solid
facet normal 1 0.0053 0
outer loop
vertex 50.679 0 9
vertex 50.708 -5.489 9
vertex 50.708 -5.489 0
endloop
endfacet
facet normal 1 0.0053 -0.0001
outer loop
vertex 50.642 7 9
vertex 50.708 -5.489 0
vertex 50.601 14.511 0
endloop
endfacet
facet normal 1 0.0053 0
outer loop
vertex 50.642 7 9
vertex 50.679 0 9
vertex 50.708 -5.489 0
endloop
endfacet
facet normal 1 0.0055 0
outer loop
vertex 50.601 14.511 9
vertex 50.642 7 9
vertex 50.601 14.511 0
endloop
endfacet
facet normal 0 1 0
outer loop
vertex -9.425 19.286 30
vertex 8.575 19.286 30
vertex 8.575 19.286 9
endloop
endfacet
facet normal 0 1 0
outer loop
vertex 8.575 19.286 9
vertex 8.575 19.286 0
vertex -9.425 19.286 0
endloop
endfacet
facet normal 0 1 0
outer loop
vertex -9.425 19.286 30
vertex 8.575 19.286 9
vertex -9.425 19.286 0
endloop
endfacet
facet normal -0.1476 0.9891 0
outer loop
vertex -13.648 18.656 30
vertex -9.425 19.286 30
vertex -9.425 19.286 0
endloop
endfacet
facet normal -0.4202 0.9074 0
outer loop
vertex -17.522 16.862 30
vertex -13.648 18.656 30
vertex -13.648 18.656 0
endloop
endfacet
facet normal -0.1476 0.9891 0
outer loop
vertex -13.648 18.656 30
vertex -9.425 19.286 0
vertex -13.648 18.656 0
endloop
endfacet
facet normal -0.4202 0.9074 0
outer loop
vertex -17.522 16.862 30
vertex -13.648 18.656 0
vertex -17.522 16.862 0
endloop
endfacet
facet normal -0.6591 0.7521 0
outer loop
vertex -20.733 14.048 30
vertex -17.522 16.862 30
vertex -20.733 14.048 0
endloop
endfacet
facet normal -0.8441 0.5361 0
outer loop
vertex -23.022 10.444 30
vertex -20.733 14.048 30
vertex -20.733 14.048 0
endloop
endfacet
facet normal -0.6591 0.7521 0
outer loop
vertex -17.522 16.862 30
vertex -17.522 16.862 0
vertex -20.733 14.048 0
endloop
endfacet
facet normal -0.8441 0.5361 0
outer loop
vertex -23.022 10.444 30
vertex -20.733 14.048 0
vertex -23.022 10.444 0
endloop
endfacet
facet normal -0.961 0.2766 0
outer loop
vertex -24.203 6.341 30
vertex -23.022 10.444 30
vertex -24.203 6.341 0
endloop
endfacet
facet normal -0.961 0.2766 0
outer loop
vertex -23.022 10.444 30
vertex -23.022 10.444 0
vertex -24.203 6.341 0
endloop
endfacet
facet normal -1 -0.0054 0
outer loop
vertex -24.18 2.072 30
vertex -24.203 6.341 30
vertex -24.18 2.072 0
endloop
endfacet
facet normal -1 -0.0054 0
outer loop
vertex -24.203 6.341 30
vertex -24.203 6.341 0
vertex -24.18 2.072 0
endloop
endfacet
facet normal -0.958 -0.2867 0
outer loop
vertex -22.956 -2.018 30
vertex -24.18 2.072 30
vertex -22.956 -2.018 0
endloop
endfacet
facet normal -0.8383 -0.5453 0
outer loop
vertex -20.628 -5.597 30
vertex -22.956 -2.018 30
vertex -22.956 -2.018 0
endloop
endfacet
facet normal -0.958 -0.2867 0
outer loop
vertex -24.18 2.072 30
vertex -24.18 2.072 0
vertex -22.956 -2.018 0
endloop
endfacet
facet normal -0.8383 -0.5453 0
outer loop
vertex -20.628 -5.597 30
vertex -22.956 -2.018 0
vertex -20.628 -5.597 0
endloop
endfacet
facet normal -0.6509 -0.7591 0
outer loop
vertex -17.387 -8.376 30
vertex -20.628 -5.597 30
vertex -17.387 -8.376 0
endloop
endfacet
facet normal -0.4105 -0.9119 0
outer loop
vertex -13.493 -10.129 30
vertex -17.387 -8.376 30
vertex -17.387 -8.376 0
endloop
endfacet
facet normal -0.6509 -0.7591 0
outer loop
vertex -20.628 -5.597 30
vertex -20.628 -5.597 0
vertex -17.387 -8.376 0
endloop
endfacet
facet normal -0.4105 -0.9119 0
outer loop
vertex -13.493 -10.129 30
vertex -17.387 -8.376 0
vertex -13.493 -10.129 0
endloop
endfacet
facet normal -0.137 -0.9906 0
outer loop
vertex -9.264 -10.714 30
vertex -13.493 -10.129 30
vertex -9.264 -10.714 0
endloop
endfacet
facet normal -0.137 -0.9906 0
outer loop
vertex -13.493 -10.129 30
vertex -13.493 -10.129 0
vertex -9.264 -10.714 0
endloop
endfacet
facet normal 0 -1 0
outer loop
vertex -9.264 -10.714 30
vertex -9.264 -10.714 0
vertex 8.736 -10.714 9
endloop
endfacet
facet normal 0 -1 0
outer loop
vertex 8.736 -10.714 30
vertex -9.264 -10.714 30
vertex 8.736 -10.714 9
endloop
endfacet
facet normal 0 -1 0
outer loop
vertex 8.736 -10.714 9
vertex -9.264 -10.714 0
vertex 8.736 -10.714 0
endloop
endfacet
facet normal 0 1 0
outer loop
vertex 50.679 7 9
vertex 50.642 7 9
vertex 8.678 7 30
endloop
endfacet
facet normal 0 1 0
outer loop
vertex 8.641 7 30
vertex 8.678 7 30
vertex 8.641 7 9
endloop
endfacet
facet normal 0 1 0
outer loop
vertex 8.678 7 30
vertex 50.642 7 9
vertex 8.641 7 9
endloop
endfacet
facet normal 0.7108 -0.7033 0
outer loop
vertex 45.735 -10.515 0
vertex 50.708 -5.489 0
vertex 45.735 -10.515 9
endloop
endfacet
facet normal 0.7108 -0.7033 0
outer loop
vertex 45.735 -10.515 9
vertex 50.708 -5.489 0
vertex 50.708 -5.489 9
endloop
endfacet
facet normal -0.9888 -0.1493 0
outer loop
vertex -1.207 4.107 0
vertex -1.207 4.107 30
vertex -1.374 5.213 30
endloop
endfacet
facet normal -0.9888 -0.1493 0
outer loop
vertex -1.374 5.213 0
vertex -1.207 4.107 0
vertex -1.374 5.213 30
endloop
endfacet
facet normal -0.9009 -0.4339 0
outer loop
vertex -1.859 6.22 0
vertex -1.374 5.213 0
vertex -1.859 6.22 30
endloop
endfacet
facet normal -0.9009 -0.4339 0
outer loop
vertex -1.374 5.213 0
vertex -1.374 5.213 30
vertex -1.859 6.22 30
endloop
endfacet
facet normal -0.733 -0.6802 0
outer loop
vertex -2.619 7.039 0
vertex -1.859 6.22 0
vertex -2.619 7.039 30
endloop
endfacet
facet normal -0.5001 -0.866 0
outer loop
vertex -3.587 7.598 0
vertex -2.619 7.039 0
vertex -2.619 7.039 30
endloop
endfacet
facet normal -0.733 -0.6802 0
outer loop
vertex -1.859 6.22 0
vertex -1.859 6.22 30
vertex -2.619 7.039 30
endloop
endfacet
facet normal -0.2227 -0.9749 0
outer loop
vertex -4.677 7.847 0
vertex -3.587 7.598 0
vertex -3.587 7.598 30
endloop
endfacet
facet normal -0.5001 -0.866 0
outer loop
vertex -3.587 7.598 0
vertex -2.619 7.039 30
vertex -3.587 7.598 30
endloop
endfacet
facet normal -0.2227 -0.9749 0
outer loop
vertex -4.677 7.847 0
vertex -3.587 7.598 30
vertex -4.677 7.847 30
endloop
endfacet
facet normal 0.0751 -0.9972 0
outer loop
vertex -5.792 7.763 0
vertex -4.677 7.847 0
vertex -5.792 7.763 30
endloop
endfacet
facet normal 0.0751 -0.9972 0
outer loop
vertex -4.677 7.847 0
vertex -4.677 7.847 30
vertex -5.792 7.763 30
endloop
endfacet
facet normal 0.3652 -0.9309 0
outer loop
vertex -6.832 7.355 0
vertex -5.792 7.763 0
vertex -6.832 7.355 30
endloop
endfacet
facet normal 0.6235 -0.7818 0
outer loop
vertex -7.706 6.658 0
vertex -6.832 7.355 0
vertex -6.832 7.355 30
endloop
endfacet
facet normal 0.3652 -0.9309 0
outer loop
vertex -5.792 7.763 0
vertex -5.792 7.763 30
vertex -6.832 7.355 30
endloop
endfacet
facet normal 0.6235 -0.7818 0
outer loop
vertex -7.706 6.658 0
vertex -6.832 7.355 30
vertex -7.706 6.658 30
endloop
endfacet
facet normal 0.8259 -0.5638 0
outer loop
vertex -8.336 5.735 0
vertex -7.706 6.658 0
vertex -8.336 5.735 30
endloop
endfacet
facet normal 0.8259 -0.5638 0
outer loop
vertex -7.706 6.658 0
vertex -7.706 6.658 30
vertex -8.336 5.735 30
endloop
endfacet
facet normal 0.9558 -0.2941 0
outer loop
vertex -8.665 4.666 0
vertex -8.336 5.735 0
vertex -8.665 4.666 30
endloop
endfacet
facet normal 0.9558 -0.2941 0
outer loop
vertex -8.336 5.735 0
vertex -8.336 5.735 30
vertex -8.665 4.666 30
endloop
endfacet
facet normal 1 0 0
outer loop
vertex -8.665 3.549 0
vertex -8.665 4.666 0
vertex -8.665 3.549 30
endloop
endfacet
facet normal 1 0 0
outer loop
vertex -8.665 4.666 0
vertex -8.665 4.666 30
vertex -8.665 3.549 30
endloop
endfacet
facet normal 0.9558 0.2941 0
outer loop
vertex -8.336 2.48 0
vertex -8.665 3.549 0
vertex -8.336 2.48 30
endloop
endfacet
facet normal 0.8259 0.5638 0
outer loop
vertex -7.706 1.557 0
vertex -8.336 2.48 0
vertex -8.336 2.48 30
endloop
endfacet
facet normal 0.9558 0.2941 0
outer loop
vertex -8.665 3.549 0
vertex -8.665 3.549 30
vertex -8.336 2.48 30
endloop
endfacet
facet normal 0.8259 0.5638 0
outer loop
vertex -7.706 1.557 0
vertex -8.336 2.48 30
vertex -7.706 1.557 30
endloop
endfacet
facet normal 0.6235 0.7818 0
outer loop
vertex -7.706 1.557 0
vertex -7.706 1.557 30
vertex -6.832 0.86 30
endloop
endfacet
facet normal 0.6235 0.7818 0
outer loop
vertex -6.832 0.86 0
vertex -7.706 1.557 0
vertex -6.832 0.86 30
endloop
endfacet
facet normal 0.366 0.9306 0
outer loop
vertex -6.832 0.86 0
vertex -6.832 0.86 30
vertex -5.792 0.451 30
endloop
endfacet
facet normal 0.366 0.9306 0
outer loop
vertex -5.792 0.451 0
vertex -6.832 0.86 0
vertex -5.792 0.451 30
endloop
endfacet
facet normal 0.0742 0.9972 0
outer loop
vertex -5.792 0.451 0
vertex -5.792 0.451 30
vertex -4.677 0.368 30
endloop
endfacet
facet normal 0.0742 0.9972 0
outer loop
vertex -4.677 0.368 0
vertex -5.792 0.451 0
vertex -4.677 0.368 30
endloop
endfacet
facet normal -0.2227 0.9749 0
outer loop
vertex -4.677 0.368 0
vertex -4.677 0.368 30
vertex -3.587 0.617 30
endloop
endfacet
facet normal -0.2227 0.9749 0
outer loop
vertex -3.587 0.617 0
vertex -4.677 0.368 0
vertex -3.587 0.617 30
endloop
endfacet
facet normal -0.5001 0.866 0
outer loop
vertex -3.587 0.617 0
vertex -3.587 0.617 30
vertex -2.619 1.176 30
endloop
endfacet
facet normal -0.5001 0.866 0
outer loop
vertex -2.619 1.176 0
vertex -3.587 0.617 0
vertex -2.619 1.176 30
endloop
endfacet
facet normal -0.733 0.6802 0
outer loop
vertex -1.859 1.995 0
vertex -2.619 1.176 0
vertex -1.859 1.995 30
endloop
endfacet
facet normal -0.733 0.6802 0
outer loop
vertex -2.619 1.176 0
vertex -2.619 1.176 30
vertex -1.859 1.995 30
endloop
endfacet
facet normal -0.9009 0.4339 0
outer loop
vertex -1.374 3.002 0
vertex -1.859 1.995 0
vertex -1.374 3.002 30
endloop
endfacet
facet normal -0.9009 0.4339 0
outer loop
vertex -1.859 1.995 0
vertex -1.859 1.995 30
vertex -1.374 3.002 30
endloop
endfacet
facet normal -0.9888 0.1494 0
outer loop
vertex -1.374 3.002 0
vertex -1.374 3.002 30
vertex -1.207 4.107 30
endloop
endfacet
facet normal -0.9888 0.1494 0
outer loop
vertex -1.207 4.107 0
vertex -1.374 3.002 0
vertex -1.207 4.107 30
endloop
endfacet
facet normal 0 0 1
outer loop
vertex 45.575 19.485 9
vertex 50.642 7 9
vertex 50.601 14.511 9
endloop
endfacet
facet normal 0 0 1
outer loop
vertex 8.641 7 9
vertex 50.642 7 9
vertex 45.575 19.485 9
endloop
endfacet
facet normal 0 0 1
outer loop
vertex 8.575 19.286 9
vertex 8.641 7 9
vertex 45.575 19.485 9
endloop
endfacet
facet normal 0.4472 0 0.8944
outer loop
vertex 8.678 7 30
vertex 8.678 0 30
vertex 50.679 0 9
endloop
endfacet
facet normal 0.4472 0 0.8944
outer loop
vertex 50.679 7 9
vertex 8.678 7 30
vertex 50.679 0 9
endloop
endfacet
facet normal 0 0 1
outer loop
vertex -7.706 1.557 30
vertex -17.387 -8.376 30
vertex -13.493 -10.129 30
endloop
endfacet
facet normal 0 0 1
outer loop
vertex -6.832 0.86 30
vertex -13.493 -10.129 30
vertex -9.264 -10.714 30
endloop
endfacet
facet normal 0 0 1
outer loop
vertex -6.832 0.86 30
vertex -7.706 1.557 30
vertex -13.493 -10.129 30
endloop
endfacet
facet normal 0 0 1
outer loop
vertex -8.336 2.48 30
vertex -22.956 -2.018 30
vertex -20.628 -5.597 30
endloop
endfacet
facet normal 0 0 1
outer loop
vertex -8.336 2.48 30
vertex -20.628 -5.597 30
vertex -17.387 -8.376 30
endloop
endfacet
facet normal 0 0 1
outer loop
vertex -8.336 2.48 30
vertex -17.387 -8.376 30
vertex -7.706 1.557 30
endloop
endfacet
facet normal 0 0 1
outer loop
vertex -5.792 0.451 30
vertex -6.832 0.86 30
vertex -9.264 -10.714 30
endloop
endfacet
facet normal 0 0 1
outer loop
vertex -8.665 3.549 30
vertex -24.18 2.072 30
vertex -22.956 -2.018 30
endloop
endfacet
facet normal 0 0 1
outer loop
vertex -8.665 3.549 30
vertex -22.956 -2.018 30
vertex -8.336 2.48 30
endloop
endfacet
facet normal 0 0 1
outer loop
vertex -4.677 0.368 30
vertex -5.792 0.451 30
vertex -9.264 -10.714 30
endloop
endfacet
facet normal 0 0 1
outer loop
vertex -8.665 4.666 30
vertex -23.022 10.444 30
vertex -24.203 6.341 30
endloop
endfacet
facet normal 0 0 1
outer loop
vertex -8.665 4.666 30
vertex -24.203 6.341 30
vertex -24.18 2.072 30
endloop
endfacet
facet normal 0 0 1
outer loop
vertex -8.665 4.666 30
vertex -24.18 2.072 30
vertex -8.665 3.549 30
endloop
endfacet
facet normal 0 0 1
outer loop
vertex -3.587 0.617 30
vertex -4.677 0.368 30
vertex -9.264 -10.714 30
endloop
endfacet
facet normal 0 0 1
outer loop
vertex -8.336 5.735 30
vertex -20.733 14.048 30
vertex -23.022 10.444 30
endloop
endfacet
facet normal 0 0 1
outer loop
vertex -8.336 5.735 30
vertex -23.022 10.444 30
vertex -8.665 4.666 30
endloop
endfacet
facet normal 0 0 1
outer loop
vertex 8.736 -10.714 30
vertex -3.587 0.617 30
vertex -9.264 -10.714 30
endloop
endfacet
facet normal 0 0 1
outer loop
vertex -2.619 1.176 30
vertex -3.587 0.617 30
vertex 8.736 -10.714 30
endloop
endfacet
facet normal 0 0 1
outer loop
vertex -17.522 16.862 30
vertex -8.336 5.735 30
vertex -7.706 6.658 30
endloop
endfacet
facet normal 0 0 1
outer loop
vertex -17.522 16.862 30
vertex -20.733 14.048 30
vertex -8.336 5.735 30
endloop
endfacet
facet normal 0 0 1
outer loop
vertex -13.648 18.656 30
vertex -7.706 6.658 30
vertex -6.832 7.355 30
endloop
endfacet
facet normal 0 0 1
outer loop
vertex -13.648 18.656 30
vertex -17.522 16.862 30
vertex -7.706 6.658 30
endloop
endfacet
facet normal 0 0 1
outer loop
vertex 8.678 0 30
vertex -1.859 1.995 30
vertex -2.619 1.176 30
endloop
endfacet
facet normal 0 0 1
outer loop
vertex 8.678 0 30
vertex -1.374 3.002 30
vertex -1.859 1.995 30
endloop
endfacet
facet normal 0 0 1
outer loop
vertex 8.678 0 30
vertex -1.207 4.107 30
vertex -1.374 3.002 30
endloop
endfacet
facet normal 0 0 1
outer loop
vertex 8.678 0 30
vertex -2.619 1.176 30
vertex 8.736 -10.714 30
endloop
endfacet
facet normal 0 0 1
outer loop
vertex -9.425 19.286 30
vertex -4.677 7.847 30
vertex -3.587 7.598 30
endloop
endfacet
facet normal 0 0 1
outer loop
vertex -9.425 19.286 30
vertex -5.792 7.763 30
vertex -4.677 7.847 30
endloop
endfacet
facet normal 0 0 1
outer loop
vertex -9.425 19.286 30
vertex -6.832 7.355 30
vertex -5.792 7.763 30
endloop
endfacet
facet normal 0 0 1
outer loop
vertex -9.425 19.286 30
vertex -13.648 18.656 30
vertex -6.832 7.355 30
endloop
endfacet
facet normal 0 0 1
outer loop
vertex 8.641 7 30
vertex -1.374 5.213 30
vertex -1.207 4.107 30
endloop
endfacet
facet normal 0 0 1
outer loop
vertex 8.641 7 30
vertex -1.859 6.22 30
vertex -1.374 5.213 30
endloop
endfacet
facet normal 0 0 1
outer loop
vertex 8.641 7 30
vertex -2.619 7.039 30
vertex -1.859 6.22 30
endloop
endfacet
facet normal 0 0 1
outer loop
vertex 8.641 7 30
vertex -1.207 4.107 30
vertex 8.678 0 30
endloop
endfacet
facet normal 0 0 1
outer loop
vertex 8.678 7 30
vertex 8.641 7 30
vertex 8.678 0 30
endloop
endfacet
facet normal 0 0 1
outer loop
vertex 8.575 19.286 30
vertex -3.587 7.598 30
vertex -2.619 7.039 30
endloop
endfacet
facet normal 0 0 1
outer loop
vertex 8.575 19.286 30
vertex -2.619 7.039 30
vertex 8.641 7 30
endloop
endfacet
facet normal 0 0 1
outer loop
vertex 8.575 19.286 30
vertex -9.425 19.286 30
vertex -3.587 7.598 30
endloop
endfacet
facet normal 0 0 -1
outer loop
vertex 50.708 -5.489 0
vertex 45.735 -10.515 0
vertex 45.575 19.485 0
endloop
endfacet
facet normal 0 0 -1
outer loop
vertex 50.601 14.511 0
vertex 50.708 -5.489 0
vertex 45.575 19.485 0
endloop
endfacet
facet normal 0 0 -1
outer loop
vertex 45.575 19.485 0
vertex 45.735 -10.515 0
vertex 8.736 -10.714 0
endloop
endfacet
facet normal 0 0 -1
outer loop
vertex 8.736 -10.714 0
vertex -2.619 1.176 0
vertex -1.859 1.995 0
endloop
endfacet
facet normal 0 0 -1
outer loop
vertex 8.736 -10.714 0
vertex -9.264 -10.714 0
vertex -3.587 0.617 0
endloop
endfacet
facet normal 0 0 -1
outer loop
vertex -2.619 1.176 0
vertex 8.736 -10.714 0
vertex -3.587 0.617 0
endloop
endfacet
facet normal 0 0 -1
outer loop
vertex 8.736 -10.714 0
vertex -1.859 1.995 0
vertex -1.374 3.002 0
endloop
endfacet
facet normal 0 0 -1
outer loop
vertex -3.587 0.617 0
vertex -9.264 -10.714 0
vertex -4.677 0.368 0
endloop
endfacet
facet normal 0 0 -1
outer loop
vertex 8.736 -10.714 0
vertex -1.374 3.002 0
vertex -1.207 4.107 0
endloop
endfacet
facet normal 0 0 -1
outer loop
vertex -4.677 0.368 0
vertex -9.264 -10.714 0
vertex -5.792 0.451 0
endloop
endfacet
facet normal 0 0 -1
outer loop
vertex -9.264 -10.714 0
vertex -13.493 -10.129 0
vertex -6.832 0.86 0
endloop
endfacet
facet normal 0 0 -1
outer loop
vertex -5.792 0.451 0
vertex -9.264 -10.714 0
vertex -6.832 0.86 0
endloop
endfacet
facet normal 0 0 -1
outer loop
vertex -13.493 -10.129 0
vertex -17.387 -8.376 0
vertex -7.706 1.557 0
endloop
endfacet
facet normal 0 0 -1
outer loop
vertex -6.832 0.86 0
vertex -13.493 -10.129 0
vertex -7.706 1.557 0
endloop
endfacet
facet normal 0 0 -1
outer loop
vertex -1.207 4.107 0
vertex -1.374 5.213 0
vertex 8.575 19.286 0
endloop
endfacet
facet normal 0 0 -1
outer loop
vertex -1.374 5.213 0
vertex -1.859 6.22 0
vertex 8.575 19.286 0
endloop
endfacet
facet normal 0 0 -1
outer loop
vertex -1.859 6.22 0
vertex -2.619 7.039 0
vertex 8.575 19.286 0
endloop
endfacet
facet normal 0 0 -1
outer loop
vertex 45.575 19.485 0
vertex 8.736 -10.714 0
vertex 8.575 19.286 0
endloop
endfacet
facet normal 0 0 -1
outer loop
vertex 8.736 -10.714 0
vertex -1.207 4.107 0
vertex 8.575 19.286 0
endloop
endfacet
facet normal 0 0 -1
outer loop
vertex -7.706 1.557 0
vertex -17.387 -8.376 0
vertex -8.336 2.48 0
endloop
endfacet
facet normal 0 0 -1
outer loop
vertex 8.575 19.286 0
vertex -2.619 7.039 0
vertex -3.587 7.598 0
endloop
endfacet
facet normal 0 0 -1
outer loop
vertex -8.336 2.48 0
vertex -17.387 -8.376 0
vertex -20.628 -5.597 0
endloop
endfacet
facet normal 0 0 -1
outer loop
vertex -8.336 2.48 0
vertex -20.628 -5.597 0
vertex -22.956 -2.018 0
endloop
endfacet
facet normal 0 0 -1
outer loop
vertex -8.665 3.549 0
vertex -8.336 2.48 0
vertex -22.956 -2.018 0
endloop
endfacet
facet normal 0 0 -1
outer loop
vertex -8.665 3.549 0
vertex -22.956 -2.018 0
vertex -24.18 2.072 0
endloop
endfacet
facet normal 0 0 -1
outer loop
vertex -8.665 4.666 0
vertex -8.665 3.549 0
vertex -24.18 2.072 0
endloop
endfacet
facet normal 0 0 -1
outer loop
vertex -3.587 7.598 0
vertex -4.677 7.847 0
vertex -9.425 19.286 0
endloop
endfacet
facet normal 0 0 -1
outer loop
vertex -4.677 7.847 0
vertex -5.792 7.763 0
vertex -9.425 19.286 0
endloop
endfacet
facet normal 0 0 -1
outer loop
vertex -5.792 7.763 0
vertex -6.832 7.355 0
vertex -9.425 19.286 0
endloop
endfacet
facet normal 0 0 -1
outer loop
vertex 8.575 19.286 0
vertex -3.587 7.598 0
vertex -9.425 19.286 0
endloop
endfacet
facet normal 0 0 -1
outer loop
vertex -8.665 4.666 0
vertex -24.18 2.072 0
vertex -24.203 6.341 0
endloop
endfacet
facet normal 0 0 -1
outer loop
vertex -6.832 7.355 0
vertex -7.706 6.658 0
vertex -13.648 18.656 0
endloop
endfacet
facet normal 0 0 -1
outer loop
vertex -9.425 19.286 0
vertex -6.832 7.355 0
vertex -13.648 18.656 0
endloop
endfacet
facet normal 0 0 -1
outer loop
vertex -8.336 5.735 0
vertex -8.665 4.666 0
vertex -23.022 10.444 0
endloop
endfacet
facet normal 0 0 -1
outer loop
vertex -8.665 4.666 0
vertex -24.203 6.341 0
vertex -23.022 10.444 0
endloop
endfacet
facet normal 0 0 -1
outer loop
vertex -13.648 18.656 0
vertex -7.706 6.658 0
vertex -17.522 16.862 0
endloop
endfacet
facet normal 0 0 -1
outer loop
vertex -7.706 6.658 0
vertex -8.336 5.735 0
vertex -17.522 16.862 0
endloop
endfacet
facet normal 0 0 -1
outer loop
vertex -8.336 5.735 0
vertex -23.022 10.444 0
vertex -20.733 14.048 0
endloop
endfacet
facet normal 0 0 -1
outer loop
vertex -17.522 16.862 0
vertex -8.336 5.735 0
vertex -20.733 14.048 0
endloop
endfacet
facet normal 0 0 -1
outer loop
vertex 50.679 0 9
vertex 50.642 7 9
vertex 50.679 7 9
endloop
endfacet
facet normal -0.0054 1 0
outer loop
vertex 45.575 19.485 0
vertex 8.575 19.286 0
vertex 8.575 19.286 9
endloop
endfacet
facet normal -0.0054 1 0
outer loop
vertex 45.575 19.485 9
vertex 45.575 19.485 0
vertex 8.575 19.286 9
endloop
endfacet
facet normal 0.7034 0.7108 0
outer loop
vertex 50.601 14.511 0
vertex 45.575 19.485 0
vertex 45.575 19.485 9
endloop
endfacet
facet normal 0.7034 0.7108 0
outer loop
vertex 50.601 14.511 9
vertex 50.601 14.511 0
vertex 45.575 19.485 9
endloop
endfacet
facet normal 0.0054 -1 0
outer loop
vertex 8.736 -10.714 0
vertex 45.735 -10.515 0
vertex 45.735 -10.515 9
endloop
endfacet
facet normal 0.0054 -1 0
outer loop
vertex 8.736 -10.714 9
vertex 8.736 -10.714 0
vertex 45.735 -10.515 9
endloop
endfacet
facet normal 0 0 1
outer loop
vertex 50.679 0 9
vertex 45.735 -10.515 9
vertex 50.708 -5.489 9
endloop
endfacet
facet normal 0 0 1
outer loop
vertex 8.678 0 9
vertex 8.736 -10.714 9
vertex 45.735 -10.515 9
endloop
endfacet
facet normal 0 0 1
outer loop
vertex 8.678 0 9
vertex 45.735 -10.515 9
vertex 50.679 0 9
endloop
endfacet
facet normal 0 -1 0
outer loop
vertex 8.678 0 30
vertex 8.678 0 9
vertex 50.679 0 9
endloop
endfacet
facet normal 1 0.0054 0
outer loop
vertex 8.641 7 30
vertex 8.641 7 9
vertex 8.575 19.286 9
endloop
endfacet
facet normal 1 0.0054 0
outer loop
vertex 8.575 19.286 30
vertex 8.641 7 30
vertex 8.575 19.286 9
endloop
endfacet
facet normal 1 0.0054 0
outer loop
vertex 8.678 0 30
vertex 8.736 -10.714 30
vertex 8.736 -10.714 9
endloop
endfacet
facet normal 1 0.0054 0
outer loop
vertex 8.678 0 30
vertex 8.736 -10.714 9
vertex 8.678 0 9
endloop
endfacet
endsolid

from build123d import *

# Parameters (mm, degrees)
F1_DEPTH  = 30
F2_R      = 3.75
F3_DEPTH  = 30
F4_W      = 30.0004304858
F4_H      = 9
F5_DEPTH  = 42
F6_SIZE   = 5
F7_W      = 0.0346347876
F7_H      = 6.4651286568
F8_DEPTH  = 21
F10_DEPTH = 25


with BuildPart() as f1:
    # F0 (on Top) → F1 (new body)
    with BuildSketch(Plane.XY):
        with BuildLine():
            Line((8.7358052025, -10.7137067538), (8.5750901289, 19.2862932462))
            Line((8.5750901289, 19.2862932462), (-9.4249098711, 19.2862932462))
            ThreePointArc((-9.4249098711, 19.2862932462), (-24.3445523343, 4.2059357094), (-9.2641947975, -10.7137067538))
            Line((-9.2641947975, -10.7137067538), (8.7358052025, -10.7137067538))
        make_face()
    extrude(amount=F1_DEPTH)

    # F2 (on face) → F3 (cut)
    with BuildSketch(Plane.XY.offset(30)):
        with Locations((-4.9572857097, 4.1074641049)):
            Circle(F2_R)
    extrude(amount=-F3_DEPTH, mode=Mode.SUBTRACT)

    # F4 (on face) → F5 (join)
    with BuildSketch(Plane(origin=(8.6781610067, 0.0464903762, 0), x_dir=(-0.0053570922, 0.9999856507, 0), z_dir=(0.9999856507, 0.0053570922, 0))):
        with Locations((4.2398637092, 4.5)):
            Rectangle(F4_W, F4_H)
    extrude(amount=F5_DEPTH)

    # F6
    f6_edges = [f1.edges().sort_by_distance(p)[0] for p in [
        (50.735203, -10.488709, 4.5),
        (50.574487, 19.511291, 4.5),
    ]]
    chamfer(f6_edges, length=F6_SIZE)

    # F7 (on face) → F8 (join)
    with BuildSketch(Plane.XY.offset(9)):
        with Locations((50.6616953499, 3.2325643284)):
            Rectangle(F7_W, F7_H)
        Polygon((8.6409098797, 0), (50.6443779561, 0), (50.6443779561, 6.4651286568), (50.6790127437, 6.4651286568), (50.6790127437, 7), (8.6409098797, 7), align=None)
    extrude(amount=F8_DEPTH)

    # F9 (on face) → F10 (cut)
    with BuildSketch(Plane.XZ):
        Polygon((50.6790127437, 30), (8.6784100635, 30), (50.6790127437, 9), align=None)
    extrude(amount=-F10_DEPTH, mode=Mode.SUBTRACT)


solid = f1.part
